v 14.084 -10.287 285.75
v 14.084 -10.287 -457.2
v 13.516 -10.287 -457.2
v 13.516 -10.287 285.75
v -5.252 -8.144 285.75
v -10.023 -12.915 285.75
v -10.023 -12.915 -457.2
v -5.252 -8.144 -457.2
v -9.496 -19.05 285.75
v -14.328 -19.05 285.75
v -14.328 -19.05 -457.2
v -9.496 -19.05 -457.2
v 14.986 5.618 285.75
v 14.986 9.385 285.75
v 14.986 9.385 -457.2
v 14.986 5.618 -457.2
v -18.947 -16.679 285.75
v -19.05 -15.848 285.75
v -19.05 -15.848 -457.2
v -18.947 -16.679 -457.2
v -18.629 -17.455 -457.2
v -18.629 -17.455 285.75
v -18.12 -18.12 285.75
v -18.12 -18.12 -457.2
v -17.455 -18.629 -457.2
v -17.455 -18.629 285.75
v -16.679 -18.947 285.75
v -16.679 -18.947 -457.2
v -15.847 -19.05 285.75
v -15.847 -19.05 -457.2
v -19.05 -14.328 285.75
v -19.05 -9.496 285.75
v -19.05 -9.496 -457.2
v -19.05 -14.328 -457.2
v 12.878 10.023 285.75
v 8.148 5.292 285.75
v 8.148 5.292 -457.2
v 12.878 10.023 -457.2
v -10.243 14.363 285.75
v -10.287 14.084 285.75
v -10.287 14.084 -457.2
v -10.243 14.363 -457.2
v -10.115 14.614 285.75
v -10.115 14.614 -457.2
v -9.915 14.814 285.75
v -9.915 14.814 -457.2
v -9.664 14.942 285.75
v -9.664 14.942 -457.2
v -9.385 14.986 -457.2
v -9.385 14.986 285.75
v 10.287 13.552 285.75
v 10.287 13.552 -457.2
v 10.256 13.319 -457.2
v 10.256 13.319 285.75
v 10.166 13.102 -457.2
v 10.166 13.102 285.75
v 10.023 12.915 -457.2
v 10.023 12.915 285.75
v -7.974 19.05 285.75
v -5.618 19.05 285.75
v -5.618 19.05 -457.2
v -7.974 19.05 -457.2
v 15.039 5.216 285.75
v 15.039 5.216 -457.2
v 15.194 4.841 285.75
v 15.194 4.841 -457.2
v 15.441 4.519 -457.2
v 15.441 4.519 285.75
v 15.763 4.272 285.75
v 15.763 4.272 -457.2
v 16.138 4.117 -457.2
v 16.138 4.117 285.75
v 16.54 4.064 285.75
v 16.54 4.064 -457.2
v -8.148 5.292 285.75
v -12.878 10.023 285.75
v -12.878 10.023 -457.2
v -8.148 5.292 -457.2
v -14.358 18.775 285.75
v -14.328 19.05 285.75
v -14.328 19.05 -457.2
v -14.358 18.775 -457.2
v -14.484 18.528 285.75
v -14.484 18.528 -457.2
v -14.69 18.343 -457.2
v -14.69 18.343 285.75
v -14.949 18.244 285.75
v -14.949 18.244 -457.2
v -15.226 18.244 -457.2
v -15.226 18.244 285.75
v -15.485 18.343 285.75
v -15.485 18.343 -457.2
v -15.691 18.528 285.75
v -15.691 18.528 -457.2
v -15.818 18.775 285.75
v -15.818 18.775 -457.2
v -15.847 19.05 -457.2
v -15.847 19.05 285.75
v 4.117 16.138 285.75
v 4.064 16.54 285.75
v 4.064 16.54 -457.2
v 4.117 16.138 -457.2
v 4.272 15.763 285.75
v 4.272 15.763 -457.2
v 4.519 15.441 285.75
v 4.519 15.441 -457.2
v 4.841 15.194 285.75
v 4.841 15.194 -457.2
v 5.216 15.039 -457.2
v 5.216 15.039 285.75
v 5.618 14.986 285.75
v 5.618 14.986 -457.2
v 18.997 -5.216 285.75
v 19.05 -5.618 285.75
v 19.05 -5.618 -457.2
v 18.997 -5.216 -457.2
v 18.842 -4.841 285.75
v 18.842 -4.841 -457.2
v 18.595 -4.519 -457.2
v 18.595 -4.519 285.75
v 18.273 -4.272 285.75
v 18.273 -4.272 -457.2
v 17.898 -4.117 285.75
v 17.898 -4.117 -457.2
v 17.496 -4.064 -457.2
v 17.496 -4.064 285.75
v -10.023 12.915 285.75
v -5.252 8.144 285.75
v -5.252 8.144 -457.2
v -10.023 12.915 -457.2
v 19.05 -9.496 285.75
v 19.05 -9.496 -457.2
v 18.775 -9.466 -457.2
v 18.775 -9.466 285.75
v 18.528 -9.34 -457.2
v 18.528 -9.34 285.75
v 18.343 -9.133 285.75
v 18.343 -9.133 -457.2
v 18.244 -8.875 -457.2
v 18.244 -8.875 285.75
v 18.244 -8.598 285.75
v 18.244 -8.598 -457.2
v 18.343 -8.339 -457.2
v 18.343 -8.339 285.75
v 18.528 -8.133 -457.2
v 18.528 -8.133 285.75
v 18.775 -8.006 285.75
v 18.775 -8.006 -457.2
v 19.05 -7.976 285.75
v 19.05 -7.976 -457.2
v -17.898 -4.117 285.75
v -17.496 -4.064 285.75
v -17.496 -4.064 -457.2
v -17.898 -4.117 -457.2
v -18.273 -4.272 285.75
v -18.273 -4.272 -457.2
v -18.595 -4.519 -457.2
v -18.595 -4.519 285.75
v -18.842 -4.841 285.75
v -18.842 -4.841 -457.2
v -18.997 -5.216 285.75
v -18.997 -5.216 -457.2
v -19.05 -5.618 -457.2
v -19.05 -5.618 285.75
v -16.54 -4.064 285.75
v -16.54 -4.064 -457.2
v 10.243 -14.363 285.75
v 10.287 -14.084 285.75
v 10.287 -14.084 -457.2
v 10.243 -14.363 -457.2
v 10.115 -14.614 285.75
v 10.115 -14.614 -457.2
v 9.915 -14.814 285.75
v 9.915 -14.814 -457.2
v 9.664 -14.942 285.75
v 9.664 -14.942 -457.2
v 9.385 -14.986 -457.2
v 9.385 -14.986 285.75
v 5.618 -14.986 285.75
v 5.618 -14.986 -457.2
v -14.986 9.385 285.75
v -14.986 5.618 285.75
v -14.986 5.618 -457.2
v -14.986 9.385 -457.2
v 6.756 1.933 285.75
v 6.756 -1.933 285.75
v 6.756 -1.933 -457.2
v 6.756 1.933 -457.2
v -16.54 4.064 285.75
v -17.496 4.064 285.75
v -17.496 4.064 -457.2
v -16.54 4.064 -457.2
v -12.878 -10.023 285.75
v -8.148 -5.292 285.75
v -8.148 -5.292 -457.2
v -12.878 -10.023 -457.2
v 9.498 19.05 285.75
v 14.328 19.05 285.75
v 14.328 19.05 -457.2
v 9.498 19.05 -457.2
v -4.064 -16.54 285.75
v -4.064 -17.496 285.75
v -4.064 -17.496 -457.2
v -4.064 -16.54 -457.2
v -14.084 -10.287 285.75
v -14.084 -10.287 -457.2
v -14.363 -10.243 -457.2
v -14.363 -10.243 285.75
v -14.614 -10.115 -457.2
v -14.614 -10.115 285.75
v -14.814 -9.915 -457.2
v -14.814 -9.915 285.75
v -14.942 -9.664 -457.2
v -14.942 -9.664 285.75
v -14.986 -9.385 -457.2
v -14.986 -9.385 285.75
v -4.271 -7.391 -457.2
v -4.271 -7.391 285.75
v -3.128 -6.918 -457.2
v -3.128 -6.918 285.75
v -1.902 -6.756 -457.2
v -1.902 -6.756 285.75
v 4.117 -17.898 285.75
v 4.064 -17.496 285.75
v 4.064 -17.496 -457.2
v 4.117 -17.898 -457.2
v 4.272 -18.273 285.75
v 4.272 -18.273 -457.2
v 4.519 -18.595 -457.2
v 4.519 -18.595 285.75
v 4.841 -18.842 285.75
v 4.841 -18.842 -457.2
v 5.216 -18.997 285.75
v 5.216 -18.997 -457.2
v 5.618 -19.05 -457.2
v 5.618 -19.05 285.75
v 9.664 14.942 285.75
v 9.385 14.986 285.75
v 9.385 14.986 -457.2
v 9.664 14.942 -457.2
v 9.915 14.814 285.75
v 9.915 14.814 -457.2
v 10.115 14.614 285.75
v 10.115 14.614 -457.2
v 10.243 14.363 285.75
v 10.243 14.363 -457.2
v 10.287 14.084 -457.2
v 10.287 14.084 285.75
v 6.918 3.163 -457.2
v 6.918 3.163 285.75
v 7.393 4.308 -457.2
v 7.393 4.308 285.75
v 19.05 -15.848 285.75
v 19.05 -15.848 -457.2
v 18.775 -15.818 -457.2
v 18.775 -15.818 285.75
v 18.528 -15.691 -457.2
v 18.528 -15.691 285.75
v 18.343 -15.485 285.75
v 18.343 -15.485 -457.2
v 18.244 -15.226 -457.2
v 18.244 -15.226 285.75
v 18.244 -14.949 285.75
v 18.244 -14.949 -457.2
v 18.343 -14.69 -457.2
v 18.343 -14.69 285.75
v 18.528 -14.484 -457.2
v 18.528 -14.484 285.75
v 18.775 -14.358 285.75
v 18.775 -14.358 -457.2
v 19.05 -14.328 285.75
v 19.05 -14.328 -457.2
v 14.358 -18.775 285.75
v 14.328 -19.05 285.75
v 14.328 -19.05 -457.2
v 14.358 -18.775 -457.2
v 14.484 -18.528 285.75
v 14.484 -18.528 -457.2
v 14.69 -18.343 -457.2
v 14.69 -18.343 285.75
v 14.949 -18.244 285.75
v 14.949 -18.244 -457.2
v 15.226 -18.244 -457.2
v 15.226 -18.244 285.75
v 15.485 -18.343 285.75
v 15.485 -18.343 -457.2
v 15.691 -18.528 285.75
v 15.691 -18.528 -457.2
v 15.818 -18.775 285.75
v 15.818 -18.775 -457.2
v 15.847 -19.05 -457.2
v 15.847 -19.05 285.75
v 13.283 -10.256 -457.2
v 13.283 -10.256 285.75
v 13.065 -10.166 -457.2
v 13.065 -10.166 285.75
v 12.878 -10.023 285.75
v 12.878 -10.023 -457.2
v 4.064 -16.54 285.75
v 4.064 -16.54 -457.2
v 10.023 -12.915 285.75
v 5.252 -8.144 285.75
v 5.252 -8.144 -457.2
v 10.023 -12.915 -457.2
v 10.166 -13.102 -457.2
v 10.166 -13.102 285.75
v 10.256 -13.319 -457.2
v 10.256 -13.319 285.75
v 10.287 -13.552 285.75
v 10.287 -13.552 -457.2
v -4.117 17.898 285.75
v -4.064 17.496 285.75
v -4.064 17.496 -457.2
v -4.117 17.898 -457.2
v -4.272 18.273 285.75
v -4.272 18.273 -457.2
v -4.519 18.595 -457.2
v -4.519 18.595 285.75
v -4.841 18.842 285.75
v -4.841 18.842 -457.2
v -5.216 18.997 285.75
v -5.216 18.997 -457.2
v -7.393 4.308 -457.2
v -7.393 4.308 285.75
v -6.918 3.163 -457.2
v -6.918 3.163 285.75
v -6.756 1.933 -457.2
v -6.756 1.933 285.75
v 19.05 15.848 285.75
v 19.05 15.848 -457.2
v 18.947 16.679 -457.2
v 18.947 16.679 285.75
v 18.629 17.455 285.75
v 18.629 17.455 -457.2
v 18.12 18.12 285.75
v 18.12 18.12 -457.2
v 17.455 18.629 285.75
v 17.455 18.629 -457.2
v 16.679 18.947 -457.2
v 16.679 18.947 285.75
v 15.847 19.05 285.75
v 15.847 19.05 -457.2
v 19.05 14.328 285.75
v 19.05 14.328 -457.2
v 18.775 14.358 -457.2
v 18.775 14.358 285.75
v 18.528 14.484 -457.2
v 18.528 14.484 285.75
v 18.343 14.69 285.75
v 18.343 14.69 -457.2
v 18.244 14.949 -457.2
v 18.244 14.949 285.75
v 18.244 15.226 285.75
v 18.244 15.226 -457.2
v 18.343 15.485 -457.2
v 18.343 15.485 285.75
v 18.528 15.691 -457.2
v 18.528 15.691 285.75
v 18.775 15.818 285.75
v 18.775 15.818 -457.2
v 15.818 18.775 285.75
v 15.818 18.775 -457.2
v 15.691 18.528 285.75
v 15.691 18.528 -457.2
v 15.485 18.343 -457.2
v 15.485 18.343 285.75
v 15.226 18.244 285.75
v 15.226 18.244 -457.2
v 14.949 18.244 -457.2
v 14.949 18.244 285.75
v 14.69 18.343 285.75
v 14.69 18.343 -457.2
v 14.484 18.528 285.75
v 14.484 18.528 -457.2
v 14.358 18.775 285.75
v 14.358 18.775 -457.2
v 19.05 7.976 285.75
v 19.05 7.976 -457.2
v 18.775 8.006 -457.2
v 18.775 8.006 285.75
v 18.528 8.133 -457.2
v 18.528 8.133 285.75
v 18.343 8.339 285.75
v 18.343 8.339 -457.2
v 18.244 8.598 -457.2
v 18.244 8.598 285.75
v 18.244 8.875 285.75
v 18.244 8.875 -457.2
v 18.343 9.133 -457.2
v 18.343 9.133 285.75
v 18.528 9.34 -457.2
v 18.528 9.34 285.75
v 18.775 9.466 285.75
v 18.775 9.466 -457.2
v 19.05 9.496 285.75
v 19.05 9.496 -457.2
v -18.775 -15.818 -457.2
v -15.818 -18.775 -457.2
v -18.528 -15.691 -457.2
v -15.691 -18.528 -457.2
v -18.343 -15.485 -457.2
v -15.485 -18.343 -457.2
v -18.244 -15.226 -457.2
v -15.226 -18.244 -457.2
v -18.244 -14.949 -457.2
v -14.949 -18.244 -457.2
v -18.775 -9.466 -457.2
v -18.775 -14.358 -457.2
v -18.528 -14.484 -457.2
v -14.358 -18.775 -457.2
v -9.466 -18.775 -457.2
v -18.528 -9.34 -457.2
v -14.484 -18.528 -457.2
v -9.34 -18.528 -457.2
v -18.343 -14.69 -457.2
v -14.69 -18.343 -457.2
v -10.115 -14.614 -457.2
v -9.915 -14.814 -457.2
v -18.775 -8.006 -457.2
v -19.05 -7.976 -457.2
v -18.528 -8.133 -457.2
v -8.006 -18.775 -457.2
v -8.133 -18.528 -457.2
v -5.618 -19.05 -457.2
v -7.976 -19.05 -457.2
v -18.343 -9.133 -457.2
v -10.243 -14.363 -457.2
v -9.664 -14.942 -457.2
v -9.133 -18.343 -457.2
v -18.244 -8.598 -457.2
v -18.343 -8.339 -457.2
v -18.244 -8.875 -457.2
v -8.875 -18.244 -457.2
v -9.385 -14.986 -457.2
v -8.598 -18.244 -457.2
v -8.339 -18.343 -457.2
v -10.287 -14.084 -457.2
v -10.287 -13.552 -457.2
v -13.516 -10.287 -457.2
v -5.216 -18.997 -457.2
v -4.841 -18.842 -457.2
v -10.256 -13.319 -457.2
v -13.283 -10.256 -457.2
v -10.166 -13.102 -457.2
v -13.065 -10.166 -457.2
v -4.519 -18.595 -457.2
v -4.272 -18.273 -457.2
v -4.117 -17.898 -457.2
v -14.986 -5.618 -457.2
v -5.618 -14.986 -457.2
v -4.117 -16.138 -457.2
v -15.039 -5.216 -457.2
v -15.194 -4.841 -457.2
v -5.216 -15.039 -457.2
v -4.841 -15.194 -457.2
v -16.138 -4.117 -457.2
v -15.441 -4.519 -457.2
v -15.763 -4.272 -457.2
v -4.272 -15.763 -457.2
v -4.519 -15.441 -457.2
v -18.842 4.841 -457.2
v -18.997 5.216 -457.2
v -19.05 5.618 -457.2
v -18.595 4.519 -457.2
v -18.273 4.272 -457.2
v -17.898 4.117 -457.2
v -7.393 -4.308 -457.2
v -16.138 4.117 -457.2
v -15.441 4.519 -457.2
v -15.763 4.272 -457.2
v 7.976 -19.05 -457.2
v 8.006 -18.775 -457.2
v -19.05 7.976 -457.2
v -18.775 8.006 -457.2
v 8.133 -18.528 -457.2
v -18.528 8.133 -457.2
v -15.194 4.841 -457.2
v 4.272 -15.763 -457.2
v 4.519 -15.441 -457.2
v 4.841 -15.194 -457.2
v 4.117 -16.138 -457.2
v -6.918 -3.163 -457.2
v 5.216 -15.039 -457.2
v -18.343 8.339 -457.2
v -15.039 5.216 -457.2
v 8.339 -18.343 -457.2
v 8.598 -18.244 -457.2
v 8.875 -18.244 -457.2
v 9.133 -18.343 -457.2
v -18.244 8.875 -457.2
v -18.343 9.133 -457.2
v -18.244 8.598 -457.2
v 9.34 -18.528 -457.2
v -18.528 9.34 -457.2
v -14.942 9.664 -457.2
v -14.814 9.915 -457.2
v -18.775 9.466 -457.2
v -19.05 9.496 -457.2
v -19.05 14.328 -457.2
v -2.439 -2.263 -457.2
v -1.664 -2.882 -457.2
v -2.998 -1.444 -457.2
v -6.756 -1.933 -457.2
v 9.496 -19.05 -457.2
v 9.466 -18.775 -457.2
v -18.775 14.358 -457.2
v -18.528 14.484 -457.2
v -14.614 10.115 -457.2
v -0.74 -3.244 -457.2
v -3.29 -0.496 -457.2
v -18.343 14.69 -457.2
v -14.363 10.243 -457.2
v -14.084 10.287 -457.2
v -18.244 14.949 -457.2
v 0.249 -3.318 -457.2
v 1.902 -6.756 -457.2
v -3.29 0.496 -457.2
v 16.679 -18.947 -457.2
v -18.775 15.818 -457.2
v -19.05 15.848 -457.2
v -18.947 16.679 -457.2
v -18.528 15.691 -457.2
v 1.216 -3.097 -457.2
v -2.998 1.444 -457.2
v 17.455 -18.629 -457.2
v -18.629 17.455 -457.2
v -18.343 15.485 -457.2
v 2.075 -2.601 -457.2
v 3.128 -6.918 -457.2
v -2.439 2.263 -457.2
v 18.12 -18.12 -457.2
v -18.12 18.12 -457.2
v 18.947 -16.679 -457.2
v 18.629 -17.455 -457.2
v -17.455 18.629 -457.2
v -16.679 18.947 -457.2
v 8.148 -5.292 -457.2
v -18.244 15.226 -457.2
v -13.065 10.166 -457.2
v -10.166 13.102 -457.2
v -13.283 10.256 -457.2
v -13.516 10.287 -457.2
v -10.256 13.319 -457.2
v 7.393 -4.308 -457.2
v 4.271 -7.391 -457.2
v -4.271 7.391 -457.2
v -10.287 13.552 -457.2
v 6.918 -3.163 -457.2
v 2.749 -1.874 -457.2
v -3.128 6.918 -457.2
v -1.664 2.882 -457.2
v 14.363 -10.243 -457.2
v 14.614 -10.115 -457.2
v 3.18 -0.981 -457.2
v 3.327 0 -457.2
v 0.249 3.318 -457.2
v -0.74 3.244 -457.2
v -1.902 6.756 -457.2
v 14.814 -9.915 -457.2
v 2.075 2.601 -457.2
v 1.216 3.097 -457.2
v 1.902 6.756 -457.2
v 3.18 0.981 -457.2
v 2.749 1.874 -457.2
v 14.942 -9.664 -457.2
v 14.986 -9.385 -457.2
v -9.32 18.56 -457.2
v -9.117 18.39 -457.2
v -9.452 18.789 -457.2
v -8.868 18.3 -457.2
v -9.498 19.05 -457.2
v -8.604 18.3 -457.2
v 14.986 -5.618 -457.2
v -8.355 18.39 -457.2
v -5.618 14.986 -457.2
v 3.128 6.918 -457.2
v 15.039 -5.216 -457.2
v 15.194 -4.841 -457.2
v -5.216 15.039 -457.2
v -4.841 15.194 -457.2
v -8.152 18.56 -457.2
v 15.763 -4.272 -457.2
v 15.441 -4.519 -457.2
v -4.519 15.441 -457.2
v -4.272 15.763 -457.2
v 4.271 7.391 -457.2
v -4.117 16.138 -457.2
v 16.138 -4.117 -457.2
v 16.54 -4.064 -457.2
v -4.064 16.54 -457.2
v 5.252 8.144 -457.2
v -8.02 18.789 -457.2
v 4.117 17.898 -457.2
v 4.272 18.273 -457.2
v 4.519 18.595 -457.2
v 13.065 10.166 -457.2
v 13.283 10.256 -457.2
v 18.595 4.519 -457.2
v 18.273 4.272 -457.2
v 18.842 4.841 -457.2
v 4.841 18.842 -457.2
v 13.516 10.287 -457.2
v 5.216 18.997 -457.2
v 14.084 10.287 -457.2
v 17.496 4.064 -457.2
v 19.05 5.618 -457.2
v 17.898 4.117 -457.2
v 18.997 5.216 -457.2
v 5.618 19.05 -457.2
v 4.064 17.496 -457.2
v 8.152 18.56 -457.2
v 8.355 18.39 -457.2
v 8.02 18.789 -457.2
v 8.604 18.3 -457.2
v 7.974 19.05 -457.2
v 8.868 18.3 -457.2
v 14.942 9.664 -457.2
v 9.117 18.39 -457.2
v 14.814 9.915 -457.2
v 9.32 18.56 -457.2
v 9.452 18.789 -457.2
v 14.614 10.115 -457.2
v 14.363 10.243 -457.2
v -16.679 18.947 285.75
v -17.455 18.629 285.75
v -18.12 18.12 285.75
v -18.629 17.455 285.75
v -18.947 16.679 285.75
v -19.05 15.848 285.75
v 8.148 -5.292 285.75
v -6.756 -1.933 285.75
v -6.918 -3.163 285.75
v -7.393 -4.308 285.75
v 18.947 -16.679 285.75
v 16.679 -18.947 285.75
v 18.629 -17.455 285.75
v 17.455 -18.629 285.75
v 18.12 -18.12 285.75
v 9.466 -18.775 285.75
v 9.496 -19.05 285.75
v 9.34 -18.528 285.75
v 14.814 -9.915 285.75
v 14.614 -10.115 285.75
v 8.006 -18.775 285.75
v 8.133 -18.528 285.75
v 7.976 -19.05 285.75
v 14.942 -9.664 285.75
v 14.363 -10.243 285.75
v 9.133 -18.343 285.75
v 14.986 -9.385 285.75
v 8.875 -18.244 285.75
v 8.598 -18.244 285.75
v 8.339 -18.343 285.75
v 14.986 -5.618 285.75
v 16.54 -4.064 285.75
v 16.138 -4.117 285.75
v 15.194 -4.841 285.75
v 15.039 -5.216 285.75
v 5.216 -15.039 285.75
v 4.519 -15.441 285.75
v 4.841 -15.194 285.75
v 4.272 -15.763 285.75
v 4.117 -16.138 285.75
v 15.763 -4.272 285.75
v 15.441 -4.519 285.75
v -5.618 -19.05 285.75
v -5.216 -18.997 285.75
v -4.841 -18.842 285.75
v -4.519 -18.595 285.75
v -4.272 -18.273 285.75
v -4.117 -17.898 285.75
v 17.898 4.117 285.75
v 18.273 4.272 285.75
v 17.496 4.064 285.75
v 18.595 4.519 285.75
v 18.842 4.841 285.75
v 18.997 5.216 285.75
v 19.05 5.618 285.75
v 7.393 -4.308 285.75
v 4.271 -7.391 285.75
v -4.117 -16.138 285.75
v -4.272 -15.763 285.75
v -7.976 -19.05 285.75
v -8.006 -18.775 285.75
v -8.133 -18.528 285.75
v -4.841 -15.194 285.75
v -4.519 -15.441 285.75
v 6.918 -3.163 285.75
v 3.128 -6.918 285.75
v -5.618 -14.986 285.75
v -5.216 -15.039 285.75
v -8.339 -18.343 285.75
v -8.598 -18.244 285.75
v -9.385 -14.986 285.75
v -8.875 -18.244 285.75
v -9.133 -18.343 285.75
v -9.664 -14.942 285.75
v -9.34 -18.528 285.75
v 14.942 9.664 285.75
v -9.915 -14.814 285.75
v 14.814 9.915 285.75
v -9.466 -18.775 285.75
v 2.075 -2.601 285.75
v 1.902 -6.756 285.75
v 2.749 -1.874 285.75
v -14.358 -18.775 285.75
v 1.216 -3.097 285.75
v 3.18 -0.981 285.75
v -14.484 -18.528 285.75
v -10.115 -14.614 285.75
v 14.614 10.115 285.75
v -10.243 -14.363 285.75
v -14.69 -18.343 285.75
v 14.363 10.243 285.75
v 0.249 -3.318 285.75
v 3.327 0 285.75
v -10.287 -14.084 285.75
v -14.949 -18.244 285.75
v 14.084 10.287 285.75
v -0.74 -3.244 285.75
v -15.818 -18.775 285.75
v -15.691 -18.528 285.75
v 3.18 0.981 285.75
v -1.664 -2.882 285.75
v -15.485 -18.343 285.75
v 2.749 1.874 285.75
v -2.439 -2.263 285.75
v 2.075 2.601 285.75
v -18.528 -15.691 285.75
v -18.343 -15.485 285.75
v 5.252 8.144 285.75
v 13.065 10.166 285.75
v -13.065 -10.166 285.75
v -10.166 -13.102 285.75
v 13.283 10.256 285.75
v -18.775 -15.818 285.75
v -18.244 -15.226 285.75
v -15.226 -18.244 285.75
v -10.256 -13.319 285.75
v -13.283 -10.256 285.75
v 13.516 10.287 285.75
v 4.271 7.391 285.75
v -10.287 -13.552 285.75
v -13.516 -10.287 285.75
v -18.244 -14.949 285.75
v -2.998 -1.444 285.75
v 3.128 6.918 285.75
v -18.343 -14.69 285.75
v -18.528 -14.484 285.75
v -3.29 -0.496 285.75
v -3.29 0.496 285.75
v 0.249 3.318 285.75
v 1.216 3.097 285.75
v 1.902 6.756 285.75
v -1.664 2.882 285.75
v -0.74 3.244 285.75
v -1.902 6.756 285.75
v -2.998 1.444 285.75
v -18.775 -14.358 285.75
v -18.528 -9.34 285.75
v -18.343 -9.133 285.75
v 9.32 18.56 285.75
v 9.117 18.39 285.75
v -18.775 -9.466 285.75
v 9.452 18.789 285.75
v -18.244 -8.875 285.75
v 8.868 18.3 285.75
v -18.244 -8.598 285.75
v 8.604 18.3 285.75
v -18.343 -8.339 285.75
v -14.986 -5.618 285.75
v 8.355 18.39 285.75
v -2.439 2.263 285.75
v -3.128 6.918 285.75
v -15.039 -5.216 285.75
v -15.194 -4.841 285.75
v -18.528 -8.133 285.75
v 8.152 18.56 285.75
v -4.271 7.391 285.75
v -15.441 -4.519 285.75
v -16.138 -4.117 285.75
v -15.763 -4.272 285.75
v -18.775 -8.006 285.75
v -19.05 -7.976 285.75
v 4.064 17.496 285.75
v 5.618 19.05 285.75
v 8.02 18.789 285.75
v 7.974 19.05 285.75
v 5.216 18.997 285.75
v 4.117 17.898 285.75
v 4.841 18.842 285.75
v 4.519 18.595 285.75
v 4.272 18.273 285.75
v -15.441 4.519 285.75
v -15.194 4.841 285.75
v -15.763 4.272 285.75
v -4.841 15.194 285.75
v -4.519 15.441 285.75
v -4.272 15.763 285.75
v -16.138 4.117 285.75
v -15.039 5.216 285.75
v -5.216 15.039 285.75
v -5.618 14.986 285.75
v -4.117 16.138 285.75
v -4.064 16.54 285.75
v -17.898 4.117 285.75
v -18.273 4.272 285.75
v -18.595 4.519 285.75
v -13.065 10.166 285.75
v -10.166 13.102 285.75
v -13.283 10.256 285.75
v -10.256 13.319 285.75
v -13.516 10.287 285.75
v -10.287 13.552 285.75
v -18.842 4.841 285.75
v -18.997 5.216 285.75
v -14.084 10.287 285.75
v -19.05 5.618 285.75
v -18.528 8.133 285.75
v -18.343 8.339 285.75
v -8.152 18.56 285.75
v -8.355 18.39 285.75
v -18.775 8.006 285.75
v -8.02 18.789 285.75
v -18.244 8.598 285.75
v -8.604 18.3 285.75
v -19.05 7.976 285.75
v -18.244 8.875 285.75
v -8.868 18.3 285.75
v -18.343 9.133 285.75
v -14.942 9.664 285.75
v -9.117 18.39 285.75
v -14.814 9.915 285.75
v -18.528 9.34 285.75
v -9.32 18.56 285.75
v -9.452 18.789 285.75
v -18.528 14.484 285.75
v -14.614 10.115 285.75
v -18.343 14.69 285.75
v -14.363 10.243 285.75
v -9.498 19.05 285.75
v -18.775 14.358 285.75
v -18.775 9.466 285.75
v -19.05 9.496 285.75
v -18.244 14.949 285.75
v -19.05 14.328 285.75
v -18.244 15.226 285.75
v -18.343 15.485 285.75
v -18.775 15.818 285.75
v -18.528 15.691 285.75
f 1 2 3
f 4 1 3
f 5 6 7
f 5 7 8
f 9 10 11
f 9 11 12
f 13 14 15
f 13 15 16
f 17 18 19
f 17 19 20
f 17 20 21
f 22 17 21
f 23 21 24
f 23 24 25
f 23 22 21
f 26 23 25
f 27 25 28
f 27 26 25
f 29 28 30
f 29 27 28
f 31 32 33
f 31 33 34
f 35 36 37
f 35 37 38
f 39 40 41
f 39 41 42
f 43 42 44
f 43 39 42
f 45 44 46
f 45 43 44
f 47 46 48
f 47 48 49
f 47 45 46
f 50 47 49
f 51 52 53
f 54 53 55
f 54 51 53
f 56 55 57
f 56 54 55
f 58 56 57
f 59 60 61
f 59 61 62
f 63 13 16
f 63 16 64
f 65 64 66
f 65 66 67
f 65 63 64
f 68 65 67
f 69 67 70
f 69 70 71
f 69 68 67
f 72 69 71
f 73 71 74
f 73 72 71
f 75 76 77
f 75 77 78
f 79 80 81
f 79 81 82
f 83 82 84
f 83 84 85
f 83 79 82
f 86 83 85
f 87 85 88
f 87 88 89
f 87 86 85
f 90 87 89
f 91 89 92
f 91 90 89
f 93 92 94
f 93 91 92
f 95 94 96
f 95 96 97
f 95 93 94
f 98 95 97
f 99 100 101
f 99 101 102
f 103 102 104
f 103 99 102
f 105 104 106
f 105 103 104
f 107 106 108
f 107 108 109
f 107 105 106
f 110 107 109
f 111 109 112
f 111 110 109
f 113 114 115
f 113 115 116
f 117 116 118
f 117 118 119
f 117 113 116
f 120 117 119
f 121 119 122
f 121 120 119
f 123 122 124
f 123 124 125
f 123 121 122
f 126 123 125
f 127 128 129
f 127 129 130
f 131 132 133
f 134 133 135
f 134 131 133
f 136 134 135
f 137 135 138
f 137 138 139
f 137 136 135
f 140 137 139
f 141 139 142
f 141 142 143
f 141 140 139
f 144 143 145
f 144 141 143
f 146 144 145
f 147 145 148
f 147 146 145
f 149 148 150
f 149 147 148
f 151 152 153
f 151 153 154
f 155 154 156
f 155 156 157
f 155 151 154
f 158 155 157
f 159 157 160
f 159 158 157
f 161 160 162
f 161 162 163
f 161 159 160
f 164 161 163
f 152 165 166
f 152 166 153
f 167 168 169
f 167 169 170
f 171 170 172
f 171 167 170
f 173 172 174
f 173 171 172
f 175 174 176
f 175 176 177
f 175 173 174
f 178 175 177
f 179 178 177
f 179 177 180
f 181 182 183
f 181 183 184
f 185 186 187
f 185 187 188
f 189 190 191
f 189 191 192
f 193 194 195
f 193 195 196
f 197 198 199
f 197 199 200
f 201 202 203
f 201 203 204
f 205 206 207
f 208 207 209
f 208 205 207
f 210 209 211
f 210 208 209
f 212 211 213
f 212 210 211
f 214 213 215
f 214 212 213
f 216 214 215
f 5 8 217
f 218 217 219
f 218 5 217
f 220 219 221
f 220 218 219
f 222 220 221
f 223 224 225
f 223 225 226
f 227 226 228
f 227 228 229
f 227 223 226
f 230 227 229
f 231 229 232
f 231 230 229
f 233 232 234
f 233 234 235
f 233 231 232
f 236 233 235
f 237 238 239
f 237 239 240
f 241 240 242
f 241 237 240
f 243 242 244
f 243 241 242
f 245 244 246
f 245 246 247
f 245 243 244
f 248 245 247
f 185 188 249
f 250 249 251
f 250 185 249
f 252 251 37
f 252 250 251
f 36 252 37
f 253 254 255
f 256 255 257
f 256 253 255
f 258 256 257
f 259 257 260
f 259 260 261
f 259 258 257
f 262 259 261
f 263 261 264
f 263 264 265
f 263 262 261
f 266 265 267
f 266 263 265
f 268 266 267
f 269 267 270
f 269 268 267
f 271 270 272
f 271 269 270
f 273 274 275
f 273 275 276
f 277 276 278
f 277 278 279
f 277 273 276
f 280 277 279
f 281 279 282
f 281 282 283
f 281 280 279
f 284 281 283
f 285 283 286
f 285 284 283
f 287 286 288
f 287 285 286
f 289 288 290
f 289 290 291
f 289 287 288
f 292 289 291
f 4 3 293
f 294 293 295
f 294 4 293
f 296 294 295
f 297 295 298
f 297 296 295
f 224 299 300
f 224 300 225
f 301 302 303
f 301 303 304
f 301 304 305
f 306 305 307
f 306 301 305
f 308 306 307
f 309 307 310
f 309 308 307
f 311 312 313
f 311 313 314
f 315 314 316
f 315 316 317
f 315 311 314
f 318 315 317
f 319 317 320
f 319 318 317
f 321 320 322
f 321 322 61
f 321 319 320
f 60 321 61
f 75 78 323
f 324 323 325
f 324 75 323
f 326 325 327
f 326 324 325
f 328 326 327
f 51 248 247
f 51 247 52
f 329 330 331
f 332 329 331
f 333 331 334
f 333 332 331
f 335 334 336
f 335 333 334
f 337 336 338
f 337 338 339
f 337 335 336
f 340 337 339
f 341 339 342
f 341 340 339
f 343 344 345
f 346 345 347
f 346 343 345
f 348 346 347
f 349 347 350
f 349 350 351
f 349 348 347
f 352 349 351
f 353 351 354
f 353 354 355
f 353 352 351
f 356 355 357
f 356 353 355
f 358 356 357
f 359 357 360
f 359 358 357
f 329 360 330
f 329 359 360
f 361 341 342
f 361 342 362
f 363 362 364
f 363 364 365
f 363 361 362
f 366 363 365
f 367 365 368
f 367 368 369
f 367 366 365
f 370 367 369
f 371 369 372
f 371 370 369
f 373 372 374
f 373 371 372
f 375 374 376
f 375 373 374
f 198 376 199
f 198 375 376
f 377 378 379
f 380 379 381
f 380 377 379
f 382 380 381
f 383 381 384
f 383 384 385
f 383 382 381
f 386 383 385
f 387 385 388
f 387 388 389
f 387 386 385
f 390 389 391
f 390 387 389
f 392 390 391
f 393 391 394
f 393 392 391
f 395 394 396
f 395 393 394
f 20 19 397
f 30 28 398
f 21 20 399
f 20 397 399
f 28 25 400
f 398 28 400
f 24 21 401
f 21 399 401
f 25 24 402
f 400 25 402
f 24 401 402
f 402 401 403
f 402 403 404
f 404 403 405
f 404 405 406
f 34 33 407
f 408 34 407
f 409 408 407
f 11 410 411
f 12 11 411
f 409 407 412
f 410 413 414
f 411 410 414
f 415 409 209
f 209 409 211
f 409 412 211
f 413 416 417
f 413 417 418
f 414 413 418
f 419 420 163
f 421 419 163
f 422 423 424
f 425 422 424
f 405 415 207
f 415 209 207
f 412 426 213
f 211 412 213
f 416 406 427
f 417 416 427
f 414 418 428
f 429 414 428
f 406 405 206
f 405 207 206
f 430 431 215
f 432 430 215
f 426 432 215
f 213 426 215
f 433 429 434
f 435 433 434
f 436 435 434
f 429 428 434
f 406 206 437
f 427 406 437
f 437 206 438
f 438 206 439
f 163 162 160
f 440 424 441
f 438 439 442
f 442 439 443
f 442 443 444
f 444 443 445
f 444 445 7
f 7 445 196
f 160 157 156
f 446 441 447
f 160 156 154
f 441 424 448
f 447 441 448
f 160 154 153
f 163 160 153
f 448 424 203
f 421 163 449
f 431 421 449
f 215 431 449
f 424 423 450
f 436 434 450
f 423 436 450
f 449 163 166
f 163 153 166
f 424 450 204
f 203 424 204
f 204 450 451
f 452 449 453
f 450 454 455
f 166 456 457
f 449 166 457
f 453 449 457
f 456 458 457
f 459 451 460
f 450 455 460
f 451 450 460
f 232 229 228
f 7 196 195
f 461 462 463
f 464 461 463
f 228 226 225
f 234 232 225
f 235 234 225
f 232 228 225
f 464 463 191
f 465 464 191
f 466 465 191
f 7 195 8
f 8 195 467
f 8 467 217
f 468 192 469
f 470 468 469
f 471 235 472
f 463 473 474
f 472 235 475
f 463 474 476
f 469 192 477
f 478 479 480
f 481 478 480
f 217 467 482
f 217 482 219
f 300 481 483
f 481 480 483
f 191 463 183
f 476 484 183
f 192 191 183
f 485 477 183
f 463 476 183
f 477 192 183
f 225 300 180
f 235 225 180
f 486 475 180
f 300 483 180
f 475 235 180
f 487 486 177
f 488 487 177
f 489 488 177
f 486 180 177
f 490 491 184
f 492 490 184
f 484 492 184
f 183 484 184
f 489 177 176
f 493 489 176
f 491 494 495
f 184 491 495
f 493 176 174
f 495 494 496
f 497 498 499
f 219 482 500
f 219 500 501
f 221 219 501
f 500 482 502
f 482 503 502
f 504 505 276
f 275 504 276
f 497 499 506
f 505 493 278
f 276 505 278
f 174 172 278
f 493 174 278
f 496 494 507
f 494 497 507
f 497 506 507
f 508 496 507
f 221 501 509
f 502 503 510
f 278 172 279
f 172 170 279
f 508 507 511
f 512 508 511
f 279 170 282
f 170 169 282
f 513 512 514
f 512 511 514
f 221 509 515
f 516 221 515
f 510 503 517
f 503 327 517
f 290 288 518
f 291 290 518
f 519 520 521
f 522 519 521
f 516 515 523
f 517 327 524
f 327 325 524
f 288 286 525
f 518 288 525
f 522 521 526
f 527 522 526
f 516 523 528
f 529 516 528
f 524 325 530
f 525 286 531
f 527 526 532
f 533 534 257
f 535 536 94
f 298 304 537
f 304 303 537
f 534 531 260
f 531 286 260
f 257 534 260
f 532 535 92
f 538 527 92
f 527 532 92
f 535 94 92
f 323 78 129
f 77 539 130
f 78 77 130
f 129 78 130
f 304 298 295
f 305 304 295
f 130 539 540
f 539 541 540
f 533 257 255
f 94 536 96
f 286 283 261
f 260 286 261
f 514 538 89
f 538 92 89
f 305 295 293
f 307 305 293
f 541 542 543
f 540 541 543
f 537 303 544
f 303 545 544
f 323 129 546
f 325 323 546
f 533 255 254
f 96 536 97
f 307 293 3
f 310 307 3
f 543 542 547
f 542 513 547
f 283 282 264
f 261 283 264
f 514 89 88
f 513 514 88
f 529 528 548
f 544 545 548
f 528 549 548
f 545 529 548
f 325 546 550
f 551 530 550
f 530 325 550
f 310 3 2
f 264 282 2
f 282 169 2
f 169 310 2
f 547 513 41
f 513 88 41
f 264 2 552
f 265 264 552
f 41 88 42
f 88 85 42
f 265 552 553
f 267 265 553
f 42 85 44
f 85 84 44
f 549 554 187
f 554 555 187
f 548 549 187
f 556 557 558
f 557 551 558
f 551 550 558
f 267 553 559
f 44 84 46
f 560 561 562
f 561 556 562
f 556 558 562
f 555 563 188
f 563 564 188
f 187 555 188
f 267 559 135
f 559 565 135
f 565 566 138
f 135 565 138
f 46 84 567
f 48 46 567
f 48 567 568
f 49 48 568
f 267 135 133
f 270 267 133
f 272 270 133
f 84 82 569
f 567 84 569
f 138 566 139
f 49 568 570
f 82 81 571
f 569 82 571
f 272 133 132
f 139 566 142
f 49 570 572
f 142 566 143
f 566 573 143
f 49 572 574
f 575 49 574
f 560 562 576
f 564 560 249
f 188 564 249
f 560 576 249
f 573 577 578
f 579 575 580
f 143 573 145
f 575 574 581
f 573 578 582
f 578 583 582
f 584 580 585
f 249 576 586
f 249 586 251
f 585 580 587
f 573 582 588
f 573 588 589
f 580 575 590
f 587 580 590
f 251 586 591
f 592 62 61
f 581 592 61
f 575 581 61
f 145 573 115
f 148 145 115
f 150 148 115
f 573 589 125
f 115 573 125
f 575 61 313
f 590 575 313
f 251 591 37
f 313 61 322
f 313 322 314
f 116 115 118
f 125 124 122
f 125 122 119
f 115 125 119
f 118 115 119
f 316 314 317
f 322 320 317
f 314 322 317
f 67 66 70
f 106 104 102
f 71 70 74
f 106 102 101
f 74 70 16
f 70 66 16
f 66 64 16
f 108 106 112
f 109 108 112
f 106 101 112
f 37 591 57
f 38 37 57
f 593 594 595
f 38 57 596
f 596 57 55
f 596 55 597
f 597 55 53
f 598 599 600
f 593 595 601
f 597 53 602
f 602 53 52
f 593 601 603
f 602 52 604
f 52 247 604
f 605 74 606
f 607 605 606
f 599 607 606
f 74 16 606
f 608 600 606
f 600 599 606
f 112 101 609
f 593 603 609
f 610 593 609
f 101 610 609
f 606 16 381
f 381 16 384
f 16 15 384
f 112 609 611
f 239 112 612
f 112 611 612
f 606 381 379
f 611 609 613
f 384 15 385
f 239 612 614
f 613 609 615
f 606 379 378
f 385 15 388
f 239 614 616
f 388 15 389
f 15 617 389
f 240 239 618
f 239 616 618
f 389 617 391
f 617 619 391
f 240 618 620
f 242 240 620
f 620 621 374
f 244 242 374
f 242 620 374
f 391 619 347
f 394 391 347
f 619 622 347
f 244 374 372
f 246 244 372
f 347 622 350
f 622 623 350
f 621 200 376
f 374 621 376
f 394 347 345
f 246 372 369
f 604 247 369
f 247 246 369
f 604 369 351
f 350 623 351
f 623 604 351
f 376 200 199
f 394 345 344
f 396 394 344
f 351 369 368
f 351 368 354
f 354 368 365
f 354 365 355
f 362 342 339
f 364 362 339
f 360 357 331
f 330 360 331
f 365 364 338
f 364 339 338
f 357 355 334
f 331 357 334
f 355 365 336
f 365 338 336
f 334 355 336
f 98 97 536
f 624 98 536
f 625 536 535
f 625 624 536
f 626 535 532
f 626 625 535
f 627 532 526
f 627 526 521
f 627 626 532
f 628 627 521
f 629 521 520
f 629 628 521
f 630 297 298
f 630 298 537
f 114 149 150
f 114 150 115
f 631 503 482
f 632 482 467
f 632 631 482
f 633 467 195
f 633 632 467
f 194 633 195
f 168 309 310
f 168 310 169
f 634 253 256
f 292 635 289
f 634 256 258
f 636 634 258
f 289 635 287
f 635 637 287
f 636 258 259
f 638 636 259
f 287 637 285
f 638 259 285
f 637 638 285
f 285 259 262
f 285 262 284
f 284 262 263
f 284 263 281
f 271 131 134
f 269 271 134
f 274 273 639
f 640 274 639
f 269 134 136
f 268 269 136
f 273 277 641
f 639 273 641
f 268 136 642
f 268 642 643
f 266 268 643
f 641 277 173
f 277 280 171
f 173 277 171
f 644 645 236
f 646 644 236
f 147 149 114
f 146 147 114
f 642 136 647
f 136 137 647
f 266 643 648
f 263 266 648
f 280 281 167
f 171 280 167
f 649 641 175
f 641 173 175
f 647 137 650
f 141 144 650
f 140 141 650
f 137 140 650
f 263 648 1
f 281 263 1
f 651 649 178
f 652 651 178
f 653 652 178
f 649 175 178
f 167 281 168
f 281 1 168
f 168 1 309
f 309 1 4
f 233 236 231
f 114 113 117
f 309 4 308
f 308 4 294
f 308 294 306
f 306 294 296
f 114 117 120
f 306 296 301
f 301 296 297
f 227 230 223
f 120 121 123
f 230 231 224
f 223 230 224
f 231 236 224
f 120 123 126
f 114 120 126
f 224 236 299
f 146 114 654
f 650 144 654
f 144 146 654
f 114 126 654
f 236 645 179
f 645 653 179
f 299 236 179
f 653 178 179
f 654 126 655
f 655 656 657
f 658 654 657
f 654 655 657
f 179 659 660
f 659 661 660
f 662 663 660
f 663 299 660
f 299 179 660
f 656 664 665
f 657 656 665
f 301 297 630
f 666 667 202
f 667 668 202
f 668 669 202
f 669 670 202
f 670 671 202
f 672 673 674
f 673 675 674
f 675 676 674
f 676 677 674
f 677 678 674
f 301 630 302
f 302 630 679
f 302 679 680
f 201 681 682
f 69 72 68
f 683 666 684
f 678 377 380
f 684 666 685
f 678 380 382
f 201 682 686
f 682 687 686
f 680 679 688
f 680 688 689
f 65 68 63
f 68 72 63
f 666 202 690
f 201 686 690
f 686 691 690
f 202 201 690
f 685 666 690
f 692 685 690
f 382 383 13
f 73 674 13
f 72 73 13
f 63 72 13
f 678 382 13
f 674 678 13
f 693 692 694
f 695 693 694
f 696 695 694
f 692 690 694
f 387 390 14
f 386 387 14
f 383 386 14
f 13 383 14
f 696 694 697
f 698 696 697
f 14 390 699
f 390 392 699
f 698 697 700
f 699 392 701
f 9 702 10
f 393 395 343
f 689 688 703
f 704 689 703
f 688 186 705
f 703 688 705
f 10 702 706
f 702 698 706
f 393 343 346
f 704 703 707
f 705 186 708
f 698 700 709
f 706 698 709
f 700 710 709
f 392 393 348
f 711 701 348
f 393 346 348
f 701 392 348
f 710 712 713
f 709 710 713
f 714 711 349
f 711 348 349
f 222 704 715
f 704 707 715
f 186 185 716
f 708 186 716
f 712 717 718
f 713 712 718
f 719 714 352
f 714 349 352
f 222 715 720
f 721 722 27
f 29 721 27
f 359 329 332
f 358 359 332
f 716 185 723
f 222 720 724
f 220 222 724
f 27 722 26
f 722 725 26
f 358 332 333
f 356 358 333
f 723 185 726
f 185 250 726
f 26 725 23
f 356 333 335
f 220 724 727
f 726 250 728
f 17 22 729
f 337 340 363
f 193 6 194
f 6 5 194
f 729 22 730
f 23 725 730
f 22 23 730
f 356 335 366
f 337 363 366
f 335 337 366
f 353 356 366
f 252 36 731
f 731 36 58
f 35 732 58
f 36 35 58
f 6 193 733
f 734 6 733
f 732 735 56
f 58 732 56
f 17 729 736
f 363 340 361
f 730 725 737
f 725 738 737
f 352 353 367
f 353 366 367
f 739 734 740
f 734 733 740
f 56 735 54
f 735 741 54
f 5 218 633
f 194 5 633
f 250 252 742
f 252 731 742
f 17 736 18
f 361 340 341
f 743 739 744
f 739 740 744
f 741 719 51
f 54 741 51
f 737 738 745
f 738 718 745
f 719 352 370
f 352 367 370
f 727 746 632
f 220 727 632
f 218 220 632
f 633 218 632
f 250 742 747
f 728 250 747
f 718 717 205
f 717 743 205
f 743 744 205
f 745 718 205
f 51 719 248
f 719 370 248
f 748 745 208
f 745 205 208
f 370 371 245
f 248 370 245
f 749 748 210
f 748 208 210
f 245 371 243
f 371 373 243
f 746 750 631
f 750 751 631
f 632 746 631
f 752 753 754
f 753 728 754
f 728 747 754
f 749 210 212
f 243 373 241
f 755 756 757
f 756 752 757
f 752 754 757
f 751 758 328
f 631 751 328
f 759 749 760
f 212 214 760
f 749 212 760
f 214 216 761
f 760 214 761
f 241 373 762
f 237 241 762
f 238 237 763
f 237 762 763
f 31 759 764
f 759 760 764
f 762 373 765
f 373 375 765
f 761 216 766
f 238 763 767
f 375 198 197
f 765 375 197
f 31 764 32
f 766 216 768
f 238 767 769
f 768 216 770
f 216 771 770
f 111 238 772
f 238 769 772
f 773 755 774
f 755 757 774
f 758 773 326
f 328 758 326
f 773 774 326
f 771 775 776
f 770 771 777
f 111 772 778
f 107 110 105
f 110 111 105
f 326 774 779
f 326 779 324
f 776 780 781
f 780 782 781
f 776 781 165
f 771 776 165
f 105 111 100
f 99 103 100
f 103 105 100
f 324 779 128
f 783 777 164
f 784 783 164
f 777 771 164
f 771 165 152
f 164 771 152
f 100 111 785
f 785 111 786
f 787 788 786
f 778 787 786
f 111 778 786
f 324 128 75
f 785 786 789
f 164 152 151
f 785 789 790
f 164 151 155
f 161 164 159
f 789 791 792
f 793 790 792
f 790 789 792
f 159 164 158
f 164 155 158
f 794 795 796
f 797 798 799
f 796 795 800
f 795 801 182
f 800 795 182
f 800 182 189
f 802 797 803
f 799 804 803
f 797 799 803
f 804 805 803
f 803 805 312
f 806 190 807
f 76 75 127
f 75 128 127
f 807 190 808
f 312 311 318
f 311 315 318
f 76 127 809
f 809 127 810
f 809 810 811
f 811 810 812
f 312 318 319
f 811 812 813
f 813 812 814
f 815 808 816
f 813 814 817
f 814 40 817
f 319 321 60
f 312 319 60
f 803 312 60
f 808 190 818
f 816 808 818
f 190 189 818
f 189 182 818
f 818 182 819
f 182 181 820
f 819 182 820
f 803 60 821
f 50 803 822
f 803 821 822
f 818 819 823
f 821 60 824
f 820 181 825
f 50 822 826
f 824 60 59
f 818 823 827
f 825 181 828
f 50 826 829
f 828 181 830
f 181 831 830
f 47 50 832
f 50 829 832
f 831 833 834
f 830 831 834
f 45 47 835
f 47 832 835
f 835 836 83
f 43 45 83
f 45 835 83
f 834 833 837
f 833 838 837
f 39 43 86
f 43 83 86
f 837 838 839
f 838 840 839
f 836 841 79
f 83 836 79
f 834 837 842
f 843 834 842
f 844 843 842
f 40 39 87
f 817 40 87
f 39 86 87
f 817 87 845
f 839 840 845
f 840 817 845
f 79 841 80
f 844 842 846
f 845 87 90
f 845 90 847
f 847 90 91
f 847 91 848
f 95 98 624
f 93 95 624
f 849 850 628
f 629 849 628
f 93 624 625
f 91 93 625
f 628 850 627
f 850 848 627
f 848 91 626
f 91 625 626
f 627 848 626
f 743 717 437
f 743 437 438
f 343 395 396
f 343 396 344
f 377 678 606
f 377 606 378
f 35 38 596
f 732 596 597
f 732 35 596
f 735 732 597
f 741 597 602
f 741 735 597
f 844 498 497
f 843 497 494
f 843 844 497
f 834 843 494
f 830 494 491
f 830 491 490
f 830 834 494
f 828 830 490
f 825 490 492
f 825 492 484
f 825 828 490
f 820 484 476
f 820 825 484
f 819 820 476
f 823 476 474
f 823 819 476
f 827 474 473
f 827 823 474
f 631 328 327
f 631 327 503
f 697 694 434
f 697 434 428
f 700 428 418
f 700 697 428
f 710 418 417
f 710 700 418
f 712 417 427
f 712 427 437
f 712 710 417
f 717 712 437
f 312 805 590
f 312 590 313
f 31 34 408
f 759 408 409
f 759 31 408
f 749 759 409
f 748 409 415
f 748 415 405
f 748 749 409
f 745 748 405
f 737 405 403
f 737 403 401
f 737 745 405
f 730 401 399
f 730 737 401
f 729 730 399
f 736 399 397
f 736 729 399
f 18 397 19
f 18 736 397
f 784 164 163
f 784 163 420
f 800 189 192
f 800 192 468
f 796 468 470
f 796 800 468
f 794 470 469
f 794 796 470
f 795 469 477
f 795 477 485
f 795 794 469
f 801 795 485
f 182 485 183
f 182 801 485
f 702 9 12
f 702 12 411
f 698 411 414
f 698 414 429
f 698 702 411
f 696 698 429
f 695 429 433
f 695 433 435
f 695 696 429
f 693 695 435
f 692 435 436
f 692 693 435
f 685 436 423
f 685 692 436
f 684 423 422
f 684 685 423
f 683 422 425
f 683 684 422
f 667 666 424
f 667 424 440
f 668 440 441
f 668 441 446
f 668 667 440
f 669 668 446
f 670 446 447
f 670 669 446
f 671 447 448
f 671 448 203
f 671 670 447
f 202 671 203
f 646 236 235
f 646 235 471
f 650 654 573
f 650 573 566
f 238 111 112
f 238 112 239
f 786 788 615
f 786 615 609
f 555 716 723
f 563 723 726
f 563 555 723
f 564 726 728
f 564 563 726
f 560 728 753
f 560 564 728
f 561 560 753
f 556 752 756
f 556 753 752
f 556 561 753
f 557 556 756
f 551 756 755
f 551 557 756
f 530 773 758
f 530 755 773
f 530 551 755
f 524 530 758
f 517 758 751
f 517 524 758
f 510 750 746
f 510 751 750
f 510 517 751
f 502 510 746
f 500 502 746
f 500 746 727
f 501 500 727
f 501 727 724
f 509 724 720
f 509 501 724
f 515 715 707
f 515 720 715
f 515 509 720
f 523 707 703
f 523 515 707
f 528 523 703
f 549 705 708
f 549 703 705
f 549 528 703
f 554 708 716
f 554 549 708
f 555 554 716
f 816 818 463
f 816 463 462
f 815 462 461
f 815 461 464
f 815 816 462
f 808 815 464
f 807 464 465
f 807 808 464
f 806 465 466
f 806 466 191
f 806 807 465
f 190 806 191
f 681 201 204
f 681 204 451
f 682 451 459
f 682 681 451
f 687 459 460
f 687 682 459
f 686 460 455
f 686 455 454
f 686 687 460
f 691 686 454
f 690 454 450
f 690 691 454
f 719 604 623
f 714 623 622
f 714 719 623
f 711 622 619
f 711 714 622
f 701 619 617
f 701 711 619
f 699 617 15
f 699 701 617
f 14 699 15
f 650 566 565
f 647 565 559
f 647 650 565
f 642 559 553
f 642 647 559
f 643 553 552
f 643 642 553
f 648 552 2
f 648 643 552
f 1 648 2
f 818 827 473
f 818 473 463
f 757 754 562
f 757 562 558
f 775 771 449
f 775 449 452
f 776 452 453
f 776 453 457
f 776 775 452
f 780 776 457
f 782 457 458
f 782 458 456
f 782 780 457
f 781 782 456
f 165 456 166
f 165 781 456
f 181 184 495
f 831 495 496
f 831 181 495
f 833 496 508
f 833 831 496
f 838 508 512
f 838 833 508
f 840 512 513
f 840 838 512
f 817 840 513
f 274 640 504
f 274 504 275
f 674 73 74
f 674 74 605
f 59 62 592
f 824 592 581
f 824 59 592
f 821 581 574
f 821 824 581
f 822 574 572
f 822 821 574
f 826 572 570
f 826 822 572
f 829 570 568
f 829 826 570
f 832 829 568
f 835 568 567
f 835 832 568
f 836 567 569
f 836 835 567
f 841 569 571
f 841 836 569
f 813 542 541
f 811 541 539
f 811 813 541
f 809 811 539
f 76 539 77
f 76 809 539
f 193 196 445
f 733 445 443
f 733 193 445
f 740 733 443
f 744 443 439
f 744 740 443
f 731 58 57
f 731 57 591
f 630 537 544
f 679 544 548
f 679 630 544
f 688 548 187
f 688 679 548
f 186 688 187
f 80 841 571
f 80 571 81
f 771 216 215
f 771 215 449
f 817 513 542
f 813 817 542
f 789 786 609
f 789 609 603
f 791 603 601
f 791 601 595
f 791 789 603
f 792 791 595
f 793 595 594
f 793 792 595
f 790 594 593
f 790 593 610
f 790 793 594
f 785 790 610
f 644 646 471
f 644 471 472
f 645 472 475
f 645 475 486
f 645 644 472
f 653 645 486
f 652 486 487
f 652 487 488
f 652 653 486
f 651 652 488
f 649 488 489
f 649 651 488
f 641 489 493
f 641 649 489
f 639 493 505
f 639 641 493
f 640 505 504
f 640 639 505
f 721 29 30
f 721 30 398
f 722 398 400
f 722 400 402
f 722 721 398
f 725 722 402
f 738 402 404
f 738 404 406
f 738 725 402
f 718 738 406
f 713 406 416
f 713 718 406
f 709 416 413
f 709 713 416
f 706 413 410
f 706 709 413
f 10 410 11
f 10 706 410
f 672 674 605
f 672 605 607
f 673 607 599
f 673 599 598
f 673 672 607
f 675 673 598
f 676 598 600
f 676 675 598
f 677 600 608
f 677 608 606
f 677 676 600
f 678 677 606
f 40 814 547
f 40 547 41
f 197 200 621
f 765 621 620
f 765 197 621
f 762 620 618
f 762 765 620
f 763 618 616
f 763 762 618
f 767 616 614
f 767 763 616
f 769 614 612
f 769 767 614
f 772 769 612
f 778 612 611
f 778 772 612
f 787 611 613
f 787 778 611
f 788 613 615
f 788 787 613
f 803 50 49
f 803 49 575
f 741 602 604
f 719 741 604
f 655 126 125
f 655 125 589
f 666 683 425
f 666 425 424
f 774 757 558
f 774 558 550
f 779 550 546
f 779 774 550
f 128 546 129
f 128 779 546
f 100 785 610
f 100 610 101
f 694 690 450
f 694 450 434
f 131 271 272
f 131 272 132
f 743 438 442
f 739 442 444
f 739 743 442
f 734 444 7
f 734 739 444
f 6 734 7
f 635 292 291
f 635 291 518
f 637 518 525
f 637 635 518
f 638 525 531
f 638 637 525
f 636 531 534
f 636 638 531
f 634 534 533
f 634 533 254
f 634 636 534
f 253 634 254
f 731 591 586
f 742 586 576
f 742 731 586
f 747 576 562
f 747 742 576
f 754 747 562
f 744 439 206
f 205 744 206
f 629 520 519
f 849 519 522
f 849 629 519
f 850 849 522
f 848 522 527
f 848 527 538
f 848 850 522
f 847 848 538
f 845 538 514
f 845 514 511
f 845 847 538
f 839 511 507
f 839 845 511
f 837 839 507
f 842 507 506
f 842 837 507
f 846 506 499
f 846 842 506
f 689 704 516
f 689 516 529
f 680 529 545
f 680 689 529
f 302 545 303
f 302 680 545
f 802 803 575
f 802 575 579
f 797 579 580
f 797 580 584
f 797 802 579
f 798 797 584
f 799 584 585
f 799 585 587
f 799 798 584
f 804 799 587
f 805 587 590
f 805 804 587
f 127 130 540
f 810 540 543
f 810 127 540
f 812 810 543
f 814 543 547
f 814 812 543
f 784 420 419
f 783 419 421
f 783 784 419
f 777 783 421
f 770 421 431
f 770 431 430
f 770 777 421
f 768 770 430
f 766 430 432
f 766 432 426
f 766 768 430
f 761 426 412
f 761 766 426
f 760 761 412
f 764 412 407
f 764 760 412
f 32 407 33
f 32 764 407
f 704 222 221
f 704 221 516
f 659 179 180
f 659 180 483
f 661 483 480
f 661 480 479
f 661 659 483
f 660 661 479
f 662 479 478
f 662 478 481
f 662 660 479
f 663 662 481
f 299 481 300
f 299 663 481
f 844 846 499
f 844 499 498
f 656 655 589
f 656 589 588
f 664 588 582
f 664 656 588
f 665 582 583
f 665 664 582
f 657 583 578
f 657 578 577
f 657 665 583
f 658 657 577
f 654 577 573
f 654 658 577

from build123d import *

# Parameters (mm, degrees)
SKETCH3_R                = 3.3274
BOSS_EXTRUDE1_DEPTH      = 457.2
BOSS_EXTRUDE1_DEPTH_BACK = 457.2
CUT_EXTRUDE1_DEPTH       = 22.86


with BuildPart() as part:
    # Sketch3 → Boss-Extrude1 (new body, two sides)
    with BuildSketch(Plane.XY) as boss_extrude1_sk:
        with BuildLine():
            Line((-4.064, 16.539617549), (-4.064, 17.496382451))
            ThreePointArc((-4.064, 17.496382451), (-4.519044045, 18.594955955), (-5.617617549, 19.05))
            Line((-5.617617549, 19.05), (-7.974178704, 19.05))
            ThreePointArc((-7.974178704, 19.05), (-8.736178704, 18.288), (-9.498178704, 19.05))
            Line((-9.498178704, 19.05), (-14.327719207, 19.05))
            ThreePointArc((-14.327719207, 19.05), (-15.087603123, 18.231251131), (-15.847487039, 19.05))
            ThreePointArc((-15.847487039, 19.05), (-18.120176289, 18.120192083), (-19.05, 15.847509295))
            ThreePointArc((-19.05, 15.847509295), (-18.231250992, 15.08762539), (-19.05, 14.327741484))
            Line((-19.05, 14.327741484), (-19.05, 9.496091471))
            ThreePointArc((-19.05, 9.496091471), (-18.231250992, 8.736207565), (-19.05, 7.97632366))
            Line((-19.05, 7.97632366), (-19.05, 5.617617549))
            ThreePointArc((-19.05, 5.617617549), (-18.594955955, 4.519044045), (-17.496382451, 4.064))
            Line((-17.496382451, 4.064), (-16.539617549, 4.064))
            ThreePointArc((-16.539617549, 4.064), (-15.441044045, 4.519044045), (-14.986, 5.617617549))
            Line((-14.986, 5.617617549), (-14.986, 9.385342516))
            ThreePointArc((-14.986, 9.385342516), (-14.721898185, 10.022940701), (-14.0843, 10.287042516))
            Line((-14.0843, 10.287042516), (-13.516042086, 10.287042516))
            ThreePointArc((-13.516042086, 10.287042516), (-13.170975923, 10.218404478), (-12.878443117, 10.022939917))
            Line((-12.878443117, 10.022939917), (-8.14758008, 5.292065243))
            ThreePointArc((-8.14758008, 5.292065243), (-7.117955879, 3.751120653), (-6.7564, 1.933453584))
            Line((-6.7564, 1.933453584), (-6.7564, -1.933453584))
            ThreePointArc((-6.7564, -1.933453584), (-7.117955879, -3.751120653), (-8.14758008, -5.292065243))
            Line((-8.14758008, -5.292065243), (-12.878443117, -10.022939917))
            ThreePointArc((-12.878443117, -10.022939917), (-13.170975923, -10.218404478), (-13.516042086, -10.287042516))
            Line((-13.516042086, -10.287042516), (-14.0843, -10.287042516))
            ThreePointArc((-14.0843, -10.287042516), (-14.721898185, -10.022940701), (-14.986, -9.385342516))
            Line((-14.986, -9.385342516), (-14.986, -5.617617549))
            ThreePointArc((-14.986, -5.617617549), (-15.441044045, -4.519044045), (-16.539617549, -4.064))
            Line((-16.539617549, -4.064), (-17.496382451, -4.064))
            ThreePointArc((-17.496382451, -4.064), (-18.594955955, -4.519044045), (-19.05, -5.617617549))
            Line((-19.05, -5.617617549), (-19.05, -7.976318491))
            ThreePointArc((-19.05, -7.976318491), (-18.231250992, -8.736202396), (-19.05, -9.496086302))
            Line((-19.05, -9.496086302), (-19.05, -14.32774291))
            ThreePointArc((-19.05, -14.32774291), (-18.231250992, -15.087626816), (-19.05, -15.847510721))
            ThreePointArc((-19.05, -15.847510721), (-18.120175716, -18.120192644), (-15.847486868, -19.05))
            ThreePointArc((-15.847486868, -19.05), (-15.087602952, -18.231251131), (-14.327719036, -19.05))
            Line((-14.327719036, -19.05), (-9.496062448, -19.05))
            ThreePointArc((-9.496062448, -19.05), (-8.736178532, -18.231251131), (-7.976294616, -19.05))
            Line((-7.976294616, -19.05), (-5.617617549, -19.05))
            ThreePointArc((-5.617617549, -19.05), (-4.519044045, -18.594955955), (-4.064, -17.496382451))
            Line((-4.064, -17.496382451), (-4.064, -16.539617549))
            ThreePointArc((-4.064, -16.539617549), (-4.519044045, -15.441044045), (-5.617617549, -14.986))
            Line((-5.617617549, -14.986), (-9.3853, -14.986))
            ThreePointArc((-9.3853, -14.986), (-10.022898185, -14.721898185), (-10.287, -14.0843))
            Line((-10.287, -14.0843), (-10.287, -13.552357131))
            ThreePointArc((-10.287, -13.552357131), (-10.218362387, -13.207291992), (-10.022898969, -12.91475973))
            Line((-10.022898969, -12.91475973), (-5.252158105, -8.144007132))
            ThreePointArc((-5.252158105, -8.144007132), (-3.715177372, -7.117027388), (-1.902183975, -6.7564))
            Line((-1.902183975, -6.7564), (1.902183975, -6.7564))
            ThreePointArc((1.902183975, -6.7564), (3.715177372, -7.117027388), (5.252158105, -8.144007132))
            Line((5.252158105, -8.144007132), (10.022898969, -12.91475973))
            ThreePointArc((10.022898969, -12.91475973), (10.218362387, -13.207291992), (10.287, -13.552357131))
            Line((10.287, -13.552357131), (10.287, -14.0843))
            ThreePointArc((10.287, -14.0843), (10.022898185, -14.721898185), (9.3853, -14.986))
            Line((9.3853, -14.986), (5.617617549, -14.986))
            ThreePointArc((5.617617549, -14.986), (4.519044045, -15.441044045), (4.064, -16.539617549))
            Line((4.064, -16.539617549), (4.064, -17.496382451))
            ThreePointArc((4.064, -17.496382451), (4.519044045, -18.594955955), (5.617617549, -19.05))
            Line((5.617617549, -19.05), (7.976294616, -19.05))
            ThreePointArc((7.976294616, -19.05), (8.736178532, -18.231251131), (9.496062448, -19.05))
            Line((9.496062448, -19.05), (14.327719036, -19.05))
            ThreePointArc((14.327719036, -19.05), (15.087602952, -18.231251131), (15.847486868, -19.05))
            ThreePointArc((15.847486868, -19.05), (18.120175716, -18.120192644), (19.05, -15.847510721))
            ThreePointArc((19.05, -15.847510721), (18.231250992, -15.087626816), (19.05, -14.32774291))
            Line((19.05, -14.32774291), (19.05, -9.496086302))
            ThreePointArc((19.05, -9.496086302), (18.231250992, -8.736202396), (19.05, -7.976318491))
            Line((19.05, -7.976318491), (19.05, -5.617617549))
            ThreePointArc((19.05, -5.617617549), (18.594955955, -4.519044045), (17.496382451, -4.064))
            Line((17.496382451, -4.064), (16.539617549, -4.064))
            ThreePointArc((16.539617549, -4.064), (15.441044045, -4.519044045), (14.986, -5.617617549))
            Line((14.986, -5.617617549), (14.986, -9.385342516))
            ThreePointArc((14.986, -9.385342516), (14.721898185, -10.022940701), (14.0843, -10.287042516))
            Line((14.0843, -10.287042516), (13.516042086, -10.287042516))
            ThreePointArc((13.516042086, -10.287042516), (13.170975923, -10.218404478), (12.878443117, -10.022939917))
            Line((12.878443117, -10.022939917), (8.14758008, -5.292065243))
            ThreePointArc((8.14758008, -5.292065243), (7.117955879, -3.751120653), (6.7564, -1.933453584))
            Line((6.7564, -1.933453584), (6.7564, 1.933453584))
            ThreePointArc((6.7564, 1.933453584), (7.117955879, 3.751120653), (8.14758008, 5.292065243))
            Line((8.14758008, 5.292065243), (12.878443117, 10.022939917))
            ThreePointArc((12.878443117, 10.022939917), (13.170975923, 10.218404478), (13.516042086, 10.287042516))
            Line((13.516042086, 10.287042516), (14.0843, 10.287042516))
            ThreePointArc((14.0843, 10.287042516), (14.721898185, 10.022940701), (14.986, 9.385342516))
            Line((14.986, 9.385342516), (14.986, 5.617617549))
            ThreePointArc((14.986, 5.617617549), (15.441044045, 4.519044045), (16.539617549, 4.064))
            Line((16.539617549, 4.064), (17.496382451, 4.064))
            ThreePointArc((17.496382451, 4.064), (18.594955955, 4.519044045), (19.05, 5.617617549))
            Line((19.05, 5.617617549), (19.05, 7.97632366))
            ThreePointArc((19.05, 7.97632366), (18.231250992, 8.736207565), (19.05, 9.496091471))
            Line((19.05, 9.496091471), (19.05, 14.327741484))
            ThreePointArc((19.05, 14.327741484), (18.231250992, 15.08762539), (19.05, 15.847509295))
            ThreePointArc((19.05, 15.847509295), (18.120176289, 18.120192083), (15.847487039, 19.05))
            ThreePointArc((15.847487039, 19.05), (15.087603123, 18.231251131), (14.327719207, 19.05))
            Line((14.327719207, 19.05), (9.498178704, 19.05))
            ThreePointArc((9.498178704, 19.05), (8.736178704, 18.288), (7.974178704, 19.05))
            Line((7.974178704, 19.05), (5.617617549, 19.05))
            ThreePointArc((5.617617549, 19.05), (4.519044045, 18.594955955), (4.064, 17.496382451))
            Line((4.064, 17.496382451), (4.064, 16.539617549))
            ThreePointArc((4.064, 16.539617549), (4.519044045, 15.441044045), (5.617617549, 14.986))
            Line((5.617617549, 14.986), (9.3853, 14.986))
            ThreePointArc((9.3853, 14.986), (10.022898185, 14.721898185), (10.287, 14.0843))
            Line((10.287, 14.0843), (10.287, 13.552357131))
            ThreePointArc((10.287, 13.552357131), (10.218362387, 13.207291992), (10.022898969, 12.91475973))
            Line((10.022898969, 12.91475973), (5.252158105, 8.144007132))
            ThreePointArc((5.252158105, 8.144007132), (3.715177372, 7.117027388), (1.902183975, 6.7564))
            Line((1.902183975, 6.7564), (-1.902183975, 6.7564))
            ThreePointArc((-1.902183975, 6.7564), (-3.715177372, 7.117027388), (-5.252158105, 8.144007132))
            Line((-5.252158105, 8.144007132), (-10.022898969, 12.91475973))
            ThreePointArc((-10.022898969, 12.91475973), (-10.218362387, 13.207291992), (-10.287, 13.552357131))
            Line((-10.287, 13.552357131), (-10.287, 14.0843))
            ThreePointArc((-10.287, 14.0843), (-10.022898185, 14.721898185), (-9.3853, 14.986))
            Line((-9.3853, 14.986), (-5.617617549, 14.986))
            ThreePointArc((-5.617617549, 14.986), (-4.519044045, 15.441044045), (-4.064, 16.539617549))
        make_face()
        Circle(SKETCH3_R, mode=Mode.SUBTRACT)
    extrude(amount=BOSS_EXTRUDE1_DEPTH)
    extrude(boss_extrude1_sk.sketch, amount=-BOSS_EXTRUDE1_DEPTH_BACK)

    # Sketch4 → Cut-Extrude1 (cut, symmetric)
    with BuildSketch(Plane(origin=(0, 0, 0), x_dir=(1, 0, 0), z_dir=(0, 1, 0))):
        Polygon((-11.912948955, -285.75), (-26.025980117, -285.75), (-26.025980117, -467.527100799), (32.635256624, -467.527100799), (32.635256624, -285.75), align=None)
    extrude(amount=CUT_EXTRUDE1_DEPTH, both=True, mode=Mode.SUBTRACT)


solid = part.part
